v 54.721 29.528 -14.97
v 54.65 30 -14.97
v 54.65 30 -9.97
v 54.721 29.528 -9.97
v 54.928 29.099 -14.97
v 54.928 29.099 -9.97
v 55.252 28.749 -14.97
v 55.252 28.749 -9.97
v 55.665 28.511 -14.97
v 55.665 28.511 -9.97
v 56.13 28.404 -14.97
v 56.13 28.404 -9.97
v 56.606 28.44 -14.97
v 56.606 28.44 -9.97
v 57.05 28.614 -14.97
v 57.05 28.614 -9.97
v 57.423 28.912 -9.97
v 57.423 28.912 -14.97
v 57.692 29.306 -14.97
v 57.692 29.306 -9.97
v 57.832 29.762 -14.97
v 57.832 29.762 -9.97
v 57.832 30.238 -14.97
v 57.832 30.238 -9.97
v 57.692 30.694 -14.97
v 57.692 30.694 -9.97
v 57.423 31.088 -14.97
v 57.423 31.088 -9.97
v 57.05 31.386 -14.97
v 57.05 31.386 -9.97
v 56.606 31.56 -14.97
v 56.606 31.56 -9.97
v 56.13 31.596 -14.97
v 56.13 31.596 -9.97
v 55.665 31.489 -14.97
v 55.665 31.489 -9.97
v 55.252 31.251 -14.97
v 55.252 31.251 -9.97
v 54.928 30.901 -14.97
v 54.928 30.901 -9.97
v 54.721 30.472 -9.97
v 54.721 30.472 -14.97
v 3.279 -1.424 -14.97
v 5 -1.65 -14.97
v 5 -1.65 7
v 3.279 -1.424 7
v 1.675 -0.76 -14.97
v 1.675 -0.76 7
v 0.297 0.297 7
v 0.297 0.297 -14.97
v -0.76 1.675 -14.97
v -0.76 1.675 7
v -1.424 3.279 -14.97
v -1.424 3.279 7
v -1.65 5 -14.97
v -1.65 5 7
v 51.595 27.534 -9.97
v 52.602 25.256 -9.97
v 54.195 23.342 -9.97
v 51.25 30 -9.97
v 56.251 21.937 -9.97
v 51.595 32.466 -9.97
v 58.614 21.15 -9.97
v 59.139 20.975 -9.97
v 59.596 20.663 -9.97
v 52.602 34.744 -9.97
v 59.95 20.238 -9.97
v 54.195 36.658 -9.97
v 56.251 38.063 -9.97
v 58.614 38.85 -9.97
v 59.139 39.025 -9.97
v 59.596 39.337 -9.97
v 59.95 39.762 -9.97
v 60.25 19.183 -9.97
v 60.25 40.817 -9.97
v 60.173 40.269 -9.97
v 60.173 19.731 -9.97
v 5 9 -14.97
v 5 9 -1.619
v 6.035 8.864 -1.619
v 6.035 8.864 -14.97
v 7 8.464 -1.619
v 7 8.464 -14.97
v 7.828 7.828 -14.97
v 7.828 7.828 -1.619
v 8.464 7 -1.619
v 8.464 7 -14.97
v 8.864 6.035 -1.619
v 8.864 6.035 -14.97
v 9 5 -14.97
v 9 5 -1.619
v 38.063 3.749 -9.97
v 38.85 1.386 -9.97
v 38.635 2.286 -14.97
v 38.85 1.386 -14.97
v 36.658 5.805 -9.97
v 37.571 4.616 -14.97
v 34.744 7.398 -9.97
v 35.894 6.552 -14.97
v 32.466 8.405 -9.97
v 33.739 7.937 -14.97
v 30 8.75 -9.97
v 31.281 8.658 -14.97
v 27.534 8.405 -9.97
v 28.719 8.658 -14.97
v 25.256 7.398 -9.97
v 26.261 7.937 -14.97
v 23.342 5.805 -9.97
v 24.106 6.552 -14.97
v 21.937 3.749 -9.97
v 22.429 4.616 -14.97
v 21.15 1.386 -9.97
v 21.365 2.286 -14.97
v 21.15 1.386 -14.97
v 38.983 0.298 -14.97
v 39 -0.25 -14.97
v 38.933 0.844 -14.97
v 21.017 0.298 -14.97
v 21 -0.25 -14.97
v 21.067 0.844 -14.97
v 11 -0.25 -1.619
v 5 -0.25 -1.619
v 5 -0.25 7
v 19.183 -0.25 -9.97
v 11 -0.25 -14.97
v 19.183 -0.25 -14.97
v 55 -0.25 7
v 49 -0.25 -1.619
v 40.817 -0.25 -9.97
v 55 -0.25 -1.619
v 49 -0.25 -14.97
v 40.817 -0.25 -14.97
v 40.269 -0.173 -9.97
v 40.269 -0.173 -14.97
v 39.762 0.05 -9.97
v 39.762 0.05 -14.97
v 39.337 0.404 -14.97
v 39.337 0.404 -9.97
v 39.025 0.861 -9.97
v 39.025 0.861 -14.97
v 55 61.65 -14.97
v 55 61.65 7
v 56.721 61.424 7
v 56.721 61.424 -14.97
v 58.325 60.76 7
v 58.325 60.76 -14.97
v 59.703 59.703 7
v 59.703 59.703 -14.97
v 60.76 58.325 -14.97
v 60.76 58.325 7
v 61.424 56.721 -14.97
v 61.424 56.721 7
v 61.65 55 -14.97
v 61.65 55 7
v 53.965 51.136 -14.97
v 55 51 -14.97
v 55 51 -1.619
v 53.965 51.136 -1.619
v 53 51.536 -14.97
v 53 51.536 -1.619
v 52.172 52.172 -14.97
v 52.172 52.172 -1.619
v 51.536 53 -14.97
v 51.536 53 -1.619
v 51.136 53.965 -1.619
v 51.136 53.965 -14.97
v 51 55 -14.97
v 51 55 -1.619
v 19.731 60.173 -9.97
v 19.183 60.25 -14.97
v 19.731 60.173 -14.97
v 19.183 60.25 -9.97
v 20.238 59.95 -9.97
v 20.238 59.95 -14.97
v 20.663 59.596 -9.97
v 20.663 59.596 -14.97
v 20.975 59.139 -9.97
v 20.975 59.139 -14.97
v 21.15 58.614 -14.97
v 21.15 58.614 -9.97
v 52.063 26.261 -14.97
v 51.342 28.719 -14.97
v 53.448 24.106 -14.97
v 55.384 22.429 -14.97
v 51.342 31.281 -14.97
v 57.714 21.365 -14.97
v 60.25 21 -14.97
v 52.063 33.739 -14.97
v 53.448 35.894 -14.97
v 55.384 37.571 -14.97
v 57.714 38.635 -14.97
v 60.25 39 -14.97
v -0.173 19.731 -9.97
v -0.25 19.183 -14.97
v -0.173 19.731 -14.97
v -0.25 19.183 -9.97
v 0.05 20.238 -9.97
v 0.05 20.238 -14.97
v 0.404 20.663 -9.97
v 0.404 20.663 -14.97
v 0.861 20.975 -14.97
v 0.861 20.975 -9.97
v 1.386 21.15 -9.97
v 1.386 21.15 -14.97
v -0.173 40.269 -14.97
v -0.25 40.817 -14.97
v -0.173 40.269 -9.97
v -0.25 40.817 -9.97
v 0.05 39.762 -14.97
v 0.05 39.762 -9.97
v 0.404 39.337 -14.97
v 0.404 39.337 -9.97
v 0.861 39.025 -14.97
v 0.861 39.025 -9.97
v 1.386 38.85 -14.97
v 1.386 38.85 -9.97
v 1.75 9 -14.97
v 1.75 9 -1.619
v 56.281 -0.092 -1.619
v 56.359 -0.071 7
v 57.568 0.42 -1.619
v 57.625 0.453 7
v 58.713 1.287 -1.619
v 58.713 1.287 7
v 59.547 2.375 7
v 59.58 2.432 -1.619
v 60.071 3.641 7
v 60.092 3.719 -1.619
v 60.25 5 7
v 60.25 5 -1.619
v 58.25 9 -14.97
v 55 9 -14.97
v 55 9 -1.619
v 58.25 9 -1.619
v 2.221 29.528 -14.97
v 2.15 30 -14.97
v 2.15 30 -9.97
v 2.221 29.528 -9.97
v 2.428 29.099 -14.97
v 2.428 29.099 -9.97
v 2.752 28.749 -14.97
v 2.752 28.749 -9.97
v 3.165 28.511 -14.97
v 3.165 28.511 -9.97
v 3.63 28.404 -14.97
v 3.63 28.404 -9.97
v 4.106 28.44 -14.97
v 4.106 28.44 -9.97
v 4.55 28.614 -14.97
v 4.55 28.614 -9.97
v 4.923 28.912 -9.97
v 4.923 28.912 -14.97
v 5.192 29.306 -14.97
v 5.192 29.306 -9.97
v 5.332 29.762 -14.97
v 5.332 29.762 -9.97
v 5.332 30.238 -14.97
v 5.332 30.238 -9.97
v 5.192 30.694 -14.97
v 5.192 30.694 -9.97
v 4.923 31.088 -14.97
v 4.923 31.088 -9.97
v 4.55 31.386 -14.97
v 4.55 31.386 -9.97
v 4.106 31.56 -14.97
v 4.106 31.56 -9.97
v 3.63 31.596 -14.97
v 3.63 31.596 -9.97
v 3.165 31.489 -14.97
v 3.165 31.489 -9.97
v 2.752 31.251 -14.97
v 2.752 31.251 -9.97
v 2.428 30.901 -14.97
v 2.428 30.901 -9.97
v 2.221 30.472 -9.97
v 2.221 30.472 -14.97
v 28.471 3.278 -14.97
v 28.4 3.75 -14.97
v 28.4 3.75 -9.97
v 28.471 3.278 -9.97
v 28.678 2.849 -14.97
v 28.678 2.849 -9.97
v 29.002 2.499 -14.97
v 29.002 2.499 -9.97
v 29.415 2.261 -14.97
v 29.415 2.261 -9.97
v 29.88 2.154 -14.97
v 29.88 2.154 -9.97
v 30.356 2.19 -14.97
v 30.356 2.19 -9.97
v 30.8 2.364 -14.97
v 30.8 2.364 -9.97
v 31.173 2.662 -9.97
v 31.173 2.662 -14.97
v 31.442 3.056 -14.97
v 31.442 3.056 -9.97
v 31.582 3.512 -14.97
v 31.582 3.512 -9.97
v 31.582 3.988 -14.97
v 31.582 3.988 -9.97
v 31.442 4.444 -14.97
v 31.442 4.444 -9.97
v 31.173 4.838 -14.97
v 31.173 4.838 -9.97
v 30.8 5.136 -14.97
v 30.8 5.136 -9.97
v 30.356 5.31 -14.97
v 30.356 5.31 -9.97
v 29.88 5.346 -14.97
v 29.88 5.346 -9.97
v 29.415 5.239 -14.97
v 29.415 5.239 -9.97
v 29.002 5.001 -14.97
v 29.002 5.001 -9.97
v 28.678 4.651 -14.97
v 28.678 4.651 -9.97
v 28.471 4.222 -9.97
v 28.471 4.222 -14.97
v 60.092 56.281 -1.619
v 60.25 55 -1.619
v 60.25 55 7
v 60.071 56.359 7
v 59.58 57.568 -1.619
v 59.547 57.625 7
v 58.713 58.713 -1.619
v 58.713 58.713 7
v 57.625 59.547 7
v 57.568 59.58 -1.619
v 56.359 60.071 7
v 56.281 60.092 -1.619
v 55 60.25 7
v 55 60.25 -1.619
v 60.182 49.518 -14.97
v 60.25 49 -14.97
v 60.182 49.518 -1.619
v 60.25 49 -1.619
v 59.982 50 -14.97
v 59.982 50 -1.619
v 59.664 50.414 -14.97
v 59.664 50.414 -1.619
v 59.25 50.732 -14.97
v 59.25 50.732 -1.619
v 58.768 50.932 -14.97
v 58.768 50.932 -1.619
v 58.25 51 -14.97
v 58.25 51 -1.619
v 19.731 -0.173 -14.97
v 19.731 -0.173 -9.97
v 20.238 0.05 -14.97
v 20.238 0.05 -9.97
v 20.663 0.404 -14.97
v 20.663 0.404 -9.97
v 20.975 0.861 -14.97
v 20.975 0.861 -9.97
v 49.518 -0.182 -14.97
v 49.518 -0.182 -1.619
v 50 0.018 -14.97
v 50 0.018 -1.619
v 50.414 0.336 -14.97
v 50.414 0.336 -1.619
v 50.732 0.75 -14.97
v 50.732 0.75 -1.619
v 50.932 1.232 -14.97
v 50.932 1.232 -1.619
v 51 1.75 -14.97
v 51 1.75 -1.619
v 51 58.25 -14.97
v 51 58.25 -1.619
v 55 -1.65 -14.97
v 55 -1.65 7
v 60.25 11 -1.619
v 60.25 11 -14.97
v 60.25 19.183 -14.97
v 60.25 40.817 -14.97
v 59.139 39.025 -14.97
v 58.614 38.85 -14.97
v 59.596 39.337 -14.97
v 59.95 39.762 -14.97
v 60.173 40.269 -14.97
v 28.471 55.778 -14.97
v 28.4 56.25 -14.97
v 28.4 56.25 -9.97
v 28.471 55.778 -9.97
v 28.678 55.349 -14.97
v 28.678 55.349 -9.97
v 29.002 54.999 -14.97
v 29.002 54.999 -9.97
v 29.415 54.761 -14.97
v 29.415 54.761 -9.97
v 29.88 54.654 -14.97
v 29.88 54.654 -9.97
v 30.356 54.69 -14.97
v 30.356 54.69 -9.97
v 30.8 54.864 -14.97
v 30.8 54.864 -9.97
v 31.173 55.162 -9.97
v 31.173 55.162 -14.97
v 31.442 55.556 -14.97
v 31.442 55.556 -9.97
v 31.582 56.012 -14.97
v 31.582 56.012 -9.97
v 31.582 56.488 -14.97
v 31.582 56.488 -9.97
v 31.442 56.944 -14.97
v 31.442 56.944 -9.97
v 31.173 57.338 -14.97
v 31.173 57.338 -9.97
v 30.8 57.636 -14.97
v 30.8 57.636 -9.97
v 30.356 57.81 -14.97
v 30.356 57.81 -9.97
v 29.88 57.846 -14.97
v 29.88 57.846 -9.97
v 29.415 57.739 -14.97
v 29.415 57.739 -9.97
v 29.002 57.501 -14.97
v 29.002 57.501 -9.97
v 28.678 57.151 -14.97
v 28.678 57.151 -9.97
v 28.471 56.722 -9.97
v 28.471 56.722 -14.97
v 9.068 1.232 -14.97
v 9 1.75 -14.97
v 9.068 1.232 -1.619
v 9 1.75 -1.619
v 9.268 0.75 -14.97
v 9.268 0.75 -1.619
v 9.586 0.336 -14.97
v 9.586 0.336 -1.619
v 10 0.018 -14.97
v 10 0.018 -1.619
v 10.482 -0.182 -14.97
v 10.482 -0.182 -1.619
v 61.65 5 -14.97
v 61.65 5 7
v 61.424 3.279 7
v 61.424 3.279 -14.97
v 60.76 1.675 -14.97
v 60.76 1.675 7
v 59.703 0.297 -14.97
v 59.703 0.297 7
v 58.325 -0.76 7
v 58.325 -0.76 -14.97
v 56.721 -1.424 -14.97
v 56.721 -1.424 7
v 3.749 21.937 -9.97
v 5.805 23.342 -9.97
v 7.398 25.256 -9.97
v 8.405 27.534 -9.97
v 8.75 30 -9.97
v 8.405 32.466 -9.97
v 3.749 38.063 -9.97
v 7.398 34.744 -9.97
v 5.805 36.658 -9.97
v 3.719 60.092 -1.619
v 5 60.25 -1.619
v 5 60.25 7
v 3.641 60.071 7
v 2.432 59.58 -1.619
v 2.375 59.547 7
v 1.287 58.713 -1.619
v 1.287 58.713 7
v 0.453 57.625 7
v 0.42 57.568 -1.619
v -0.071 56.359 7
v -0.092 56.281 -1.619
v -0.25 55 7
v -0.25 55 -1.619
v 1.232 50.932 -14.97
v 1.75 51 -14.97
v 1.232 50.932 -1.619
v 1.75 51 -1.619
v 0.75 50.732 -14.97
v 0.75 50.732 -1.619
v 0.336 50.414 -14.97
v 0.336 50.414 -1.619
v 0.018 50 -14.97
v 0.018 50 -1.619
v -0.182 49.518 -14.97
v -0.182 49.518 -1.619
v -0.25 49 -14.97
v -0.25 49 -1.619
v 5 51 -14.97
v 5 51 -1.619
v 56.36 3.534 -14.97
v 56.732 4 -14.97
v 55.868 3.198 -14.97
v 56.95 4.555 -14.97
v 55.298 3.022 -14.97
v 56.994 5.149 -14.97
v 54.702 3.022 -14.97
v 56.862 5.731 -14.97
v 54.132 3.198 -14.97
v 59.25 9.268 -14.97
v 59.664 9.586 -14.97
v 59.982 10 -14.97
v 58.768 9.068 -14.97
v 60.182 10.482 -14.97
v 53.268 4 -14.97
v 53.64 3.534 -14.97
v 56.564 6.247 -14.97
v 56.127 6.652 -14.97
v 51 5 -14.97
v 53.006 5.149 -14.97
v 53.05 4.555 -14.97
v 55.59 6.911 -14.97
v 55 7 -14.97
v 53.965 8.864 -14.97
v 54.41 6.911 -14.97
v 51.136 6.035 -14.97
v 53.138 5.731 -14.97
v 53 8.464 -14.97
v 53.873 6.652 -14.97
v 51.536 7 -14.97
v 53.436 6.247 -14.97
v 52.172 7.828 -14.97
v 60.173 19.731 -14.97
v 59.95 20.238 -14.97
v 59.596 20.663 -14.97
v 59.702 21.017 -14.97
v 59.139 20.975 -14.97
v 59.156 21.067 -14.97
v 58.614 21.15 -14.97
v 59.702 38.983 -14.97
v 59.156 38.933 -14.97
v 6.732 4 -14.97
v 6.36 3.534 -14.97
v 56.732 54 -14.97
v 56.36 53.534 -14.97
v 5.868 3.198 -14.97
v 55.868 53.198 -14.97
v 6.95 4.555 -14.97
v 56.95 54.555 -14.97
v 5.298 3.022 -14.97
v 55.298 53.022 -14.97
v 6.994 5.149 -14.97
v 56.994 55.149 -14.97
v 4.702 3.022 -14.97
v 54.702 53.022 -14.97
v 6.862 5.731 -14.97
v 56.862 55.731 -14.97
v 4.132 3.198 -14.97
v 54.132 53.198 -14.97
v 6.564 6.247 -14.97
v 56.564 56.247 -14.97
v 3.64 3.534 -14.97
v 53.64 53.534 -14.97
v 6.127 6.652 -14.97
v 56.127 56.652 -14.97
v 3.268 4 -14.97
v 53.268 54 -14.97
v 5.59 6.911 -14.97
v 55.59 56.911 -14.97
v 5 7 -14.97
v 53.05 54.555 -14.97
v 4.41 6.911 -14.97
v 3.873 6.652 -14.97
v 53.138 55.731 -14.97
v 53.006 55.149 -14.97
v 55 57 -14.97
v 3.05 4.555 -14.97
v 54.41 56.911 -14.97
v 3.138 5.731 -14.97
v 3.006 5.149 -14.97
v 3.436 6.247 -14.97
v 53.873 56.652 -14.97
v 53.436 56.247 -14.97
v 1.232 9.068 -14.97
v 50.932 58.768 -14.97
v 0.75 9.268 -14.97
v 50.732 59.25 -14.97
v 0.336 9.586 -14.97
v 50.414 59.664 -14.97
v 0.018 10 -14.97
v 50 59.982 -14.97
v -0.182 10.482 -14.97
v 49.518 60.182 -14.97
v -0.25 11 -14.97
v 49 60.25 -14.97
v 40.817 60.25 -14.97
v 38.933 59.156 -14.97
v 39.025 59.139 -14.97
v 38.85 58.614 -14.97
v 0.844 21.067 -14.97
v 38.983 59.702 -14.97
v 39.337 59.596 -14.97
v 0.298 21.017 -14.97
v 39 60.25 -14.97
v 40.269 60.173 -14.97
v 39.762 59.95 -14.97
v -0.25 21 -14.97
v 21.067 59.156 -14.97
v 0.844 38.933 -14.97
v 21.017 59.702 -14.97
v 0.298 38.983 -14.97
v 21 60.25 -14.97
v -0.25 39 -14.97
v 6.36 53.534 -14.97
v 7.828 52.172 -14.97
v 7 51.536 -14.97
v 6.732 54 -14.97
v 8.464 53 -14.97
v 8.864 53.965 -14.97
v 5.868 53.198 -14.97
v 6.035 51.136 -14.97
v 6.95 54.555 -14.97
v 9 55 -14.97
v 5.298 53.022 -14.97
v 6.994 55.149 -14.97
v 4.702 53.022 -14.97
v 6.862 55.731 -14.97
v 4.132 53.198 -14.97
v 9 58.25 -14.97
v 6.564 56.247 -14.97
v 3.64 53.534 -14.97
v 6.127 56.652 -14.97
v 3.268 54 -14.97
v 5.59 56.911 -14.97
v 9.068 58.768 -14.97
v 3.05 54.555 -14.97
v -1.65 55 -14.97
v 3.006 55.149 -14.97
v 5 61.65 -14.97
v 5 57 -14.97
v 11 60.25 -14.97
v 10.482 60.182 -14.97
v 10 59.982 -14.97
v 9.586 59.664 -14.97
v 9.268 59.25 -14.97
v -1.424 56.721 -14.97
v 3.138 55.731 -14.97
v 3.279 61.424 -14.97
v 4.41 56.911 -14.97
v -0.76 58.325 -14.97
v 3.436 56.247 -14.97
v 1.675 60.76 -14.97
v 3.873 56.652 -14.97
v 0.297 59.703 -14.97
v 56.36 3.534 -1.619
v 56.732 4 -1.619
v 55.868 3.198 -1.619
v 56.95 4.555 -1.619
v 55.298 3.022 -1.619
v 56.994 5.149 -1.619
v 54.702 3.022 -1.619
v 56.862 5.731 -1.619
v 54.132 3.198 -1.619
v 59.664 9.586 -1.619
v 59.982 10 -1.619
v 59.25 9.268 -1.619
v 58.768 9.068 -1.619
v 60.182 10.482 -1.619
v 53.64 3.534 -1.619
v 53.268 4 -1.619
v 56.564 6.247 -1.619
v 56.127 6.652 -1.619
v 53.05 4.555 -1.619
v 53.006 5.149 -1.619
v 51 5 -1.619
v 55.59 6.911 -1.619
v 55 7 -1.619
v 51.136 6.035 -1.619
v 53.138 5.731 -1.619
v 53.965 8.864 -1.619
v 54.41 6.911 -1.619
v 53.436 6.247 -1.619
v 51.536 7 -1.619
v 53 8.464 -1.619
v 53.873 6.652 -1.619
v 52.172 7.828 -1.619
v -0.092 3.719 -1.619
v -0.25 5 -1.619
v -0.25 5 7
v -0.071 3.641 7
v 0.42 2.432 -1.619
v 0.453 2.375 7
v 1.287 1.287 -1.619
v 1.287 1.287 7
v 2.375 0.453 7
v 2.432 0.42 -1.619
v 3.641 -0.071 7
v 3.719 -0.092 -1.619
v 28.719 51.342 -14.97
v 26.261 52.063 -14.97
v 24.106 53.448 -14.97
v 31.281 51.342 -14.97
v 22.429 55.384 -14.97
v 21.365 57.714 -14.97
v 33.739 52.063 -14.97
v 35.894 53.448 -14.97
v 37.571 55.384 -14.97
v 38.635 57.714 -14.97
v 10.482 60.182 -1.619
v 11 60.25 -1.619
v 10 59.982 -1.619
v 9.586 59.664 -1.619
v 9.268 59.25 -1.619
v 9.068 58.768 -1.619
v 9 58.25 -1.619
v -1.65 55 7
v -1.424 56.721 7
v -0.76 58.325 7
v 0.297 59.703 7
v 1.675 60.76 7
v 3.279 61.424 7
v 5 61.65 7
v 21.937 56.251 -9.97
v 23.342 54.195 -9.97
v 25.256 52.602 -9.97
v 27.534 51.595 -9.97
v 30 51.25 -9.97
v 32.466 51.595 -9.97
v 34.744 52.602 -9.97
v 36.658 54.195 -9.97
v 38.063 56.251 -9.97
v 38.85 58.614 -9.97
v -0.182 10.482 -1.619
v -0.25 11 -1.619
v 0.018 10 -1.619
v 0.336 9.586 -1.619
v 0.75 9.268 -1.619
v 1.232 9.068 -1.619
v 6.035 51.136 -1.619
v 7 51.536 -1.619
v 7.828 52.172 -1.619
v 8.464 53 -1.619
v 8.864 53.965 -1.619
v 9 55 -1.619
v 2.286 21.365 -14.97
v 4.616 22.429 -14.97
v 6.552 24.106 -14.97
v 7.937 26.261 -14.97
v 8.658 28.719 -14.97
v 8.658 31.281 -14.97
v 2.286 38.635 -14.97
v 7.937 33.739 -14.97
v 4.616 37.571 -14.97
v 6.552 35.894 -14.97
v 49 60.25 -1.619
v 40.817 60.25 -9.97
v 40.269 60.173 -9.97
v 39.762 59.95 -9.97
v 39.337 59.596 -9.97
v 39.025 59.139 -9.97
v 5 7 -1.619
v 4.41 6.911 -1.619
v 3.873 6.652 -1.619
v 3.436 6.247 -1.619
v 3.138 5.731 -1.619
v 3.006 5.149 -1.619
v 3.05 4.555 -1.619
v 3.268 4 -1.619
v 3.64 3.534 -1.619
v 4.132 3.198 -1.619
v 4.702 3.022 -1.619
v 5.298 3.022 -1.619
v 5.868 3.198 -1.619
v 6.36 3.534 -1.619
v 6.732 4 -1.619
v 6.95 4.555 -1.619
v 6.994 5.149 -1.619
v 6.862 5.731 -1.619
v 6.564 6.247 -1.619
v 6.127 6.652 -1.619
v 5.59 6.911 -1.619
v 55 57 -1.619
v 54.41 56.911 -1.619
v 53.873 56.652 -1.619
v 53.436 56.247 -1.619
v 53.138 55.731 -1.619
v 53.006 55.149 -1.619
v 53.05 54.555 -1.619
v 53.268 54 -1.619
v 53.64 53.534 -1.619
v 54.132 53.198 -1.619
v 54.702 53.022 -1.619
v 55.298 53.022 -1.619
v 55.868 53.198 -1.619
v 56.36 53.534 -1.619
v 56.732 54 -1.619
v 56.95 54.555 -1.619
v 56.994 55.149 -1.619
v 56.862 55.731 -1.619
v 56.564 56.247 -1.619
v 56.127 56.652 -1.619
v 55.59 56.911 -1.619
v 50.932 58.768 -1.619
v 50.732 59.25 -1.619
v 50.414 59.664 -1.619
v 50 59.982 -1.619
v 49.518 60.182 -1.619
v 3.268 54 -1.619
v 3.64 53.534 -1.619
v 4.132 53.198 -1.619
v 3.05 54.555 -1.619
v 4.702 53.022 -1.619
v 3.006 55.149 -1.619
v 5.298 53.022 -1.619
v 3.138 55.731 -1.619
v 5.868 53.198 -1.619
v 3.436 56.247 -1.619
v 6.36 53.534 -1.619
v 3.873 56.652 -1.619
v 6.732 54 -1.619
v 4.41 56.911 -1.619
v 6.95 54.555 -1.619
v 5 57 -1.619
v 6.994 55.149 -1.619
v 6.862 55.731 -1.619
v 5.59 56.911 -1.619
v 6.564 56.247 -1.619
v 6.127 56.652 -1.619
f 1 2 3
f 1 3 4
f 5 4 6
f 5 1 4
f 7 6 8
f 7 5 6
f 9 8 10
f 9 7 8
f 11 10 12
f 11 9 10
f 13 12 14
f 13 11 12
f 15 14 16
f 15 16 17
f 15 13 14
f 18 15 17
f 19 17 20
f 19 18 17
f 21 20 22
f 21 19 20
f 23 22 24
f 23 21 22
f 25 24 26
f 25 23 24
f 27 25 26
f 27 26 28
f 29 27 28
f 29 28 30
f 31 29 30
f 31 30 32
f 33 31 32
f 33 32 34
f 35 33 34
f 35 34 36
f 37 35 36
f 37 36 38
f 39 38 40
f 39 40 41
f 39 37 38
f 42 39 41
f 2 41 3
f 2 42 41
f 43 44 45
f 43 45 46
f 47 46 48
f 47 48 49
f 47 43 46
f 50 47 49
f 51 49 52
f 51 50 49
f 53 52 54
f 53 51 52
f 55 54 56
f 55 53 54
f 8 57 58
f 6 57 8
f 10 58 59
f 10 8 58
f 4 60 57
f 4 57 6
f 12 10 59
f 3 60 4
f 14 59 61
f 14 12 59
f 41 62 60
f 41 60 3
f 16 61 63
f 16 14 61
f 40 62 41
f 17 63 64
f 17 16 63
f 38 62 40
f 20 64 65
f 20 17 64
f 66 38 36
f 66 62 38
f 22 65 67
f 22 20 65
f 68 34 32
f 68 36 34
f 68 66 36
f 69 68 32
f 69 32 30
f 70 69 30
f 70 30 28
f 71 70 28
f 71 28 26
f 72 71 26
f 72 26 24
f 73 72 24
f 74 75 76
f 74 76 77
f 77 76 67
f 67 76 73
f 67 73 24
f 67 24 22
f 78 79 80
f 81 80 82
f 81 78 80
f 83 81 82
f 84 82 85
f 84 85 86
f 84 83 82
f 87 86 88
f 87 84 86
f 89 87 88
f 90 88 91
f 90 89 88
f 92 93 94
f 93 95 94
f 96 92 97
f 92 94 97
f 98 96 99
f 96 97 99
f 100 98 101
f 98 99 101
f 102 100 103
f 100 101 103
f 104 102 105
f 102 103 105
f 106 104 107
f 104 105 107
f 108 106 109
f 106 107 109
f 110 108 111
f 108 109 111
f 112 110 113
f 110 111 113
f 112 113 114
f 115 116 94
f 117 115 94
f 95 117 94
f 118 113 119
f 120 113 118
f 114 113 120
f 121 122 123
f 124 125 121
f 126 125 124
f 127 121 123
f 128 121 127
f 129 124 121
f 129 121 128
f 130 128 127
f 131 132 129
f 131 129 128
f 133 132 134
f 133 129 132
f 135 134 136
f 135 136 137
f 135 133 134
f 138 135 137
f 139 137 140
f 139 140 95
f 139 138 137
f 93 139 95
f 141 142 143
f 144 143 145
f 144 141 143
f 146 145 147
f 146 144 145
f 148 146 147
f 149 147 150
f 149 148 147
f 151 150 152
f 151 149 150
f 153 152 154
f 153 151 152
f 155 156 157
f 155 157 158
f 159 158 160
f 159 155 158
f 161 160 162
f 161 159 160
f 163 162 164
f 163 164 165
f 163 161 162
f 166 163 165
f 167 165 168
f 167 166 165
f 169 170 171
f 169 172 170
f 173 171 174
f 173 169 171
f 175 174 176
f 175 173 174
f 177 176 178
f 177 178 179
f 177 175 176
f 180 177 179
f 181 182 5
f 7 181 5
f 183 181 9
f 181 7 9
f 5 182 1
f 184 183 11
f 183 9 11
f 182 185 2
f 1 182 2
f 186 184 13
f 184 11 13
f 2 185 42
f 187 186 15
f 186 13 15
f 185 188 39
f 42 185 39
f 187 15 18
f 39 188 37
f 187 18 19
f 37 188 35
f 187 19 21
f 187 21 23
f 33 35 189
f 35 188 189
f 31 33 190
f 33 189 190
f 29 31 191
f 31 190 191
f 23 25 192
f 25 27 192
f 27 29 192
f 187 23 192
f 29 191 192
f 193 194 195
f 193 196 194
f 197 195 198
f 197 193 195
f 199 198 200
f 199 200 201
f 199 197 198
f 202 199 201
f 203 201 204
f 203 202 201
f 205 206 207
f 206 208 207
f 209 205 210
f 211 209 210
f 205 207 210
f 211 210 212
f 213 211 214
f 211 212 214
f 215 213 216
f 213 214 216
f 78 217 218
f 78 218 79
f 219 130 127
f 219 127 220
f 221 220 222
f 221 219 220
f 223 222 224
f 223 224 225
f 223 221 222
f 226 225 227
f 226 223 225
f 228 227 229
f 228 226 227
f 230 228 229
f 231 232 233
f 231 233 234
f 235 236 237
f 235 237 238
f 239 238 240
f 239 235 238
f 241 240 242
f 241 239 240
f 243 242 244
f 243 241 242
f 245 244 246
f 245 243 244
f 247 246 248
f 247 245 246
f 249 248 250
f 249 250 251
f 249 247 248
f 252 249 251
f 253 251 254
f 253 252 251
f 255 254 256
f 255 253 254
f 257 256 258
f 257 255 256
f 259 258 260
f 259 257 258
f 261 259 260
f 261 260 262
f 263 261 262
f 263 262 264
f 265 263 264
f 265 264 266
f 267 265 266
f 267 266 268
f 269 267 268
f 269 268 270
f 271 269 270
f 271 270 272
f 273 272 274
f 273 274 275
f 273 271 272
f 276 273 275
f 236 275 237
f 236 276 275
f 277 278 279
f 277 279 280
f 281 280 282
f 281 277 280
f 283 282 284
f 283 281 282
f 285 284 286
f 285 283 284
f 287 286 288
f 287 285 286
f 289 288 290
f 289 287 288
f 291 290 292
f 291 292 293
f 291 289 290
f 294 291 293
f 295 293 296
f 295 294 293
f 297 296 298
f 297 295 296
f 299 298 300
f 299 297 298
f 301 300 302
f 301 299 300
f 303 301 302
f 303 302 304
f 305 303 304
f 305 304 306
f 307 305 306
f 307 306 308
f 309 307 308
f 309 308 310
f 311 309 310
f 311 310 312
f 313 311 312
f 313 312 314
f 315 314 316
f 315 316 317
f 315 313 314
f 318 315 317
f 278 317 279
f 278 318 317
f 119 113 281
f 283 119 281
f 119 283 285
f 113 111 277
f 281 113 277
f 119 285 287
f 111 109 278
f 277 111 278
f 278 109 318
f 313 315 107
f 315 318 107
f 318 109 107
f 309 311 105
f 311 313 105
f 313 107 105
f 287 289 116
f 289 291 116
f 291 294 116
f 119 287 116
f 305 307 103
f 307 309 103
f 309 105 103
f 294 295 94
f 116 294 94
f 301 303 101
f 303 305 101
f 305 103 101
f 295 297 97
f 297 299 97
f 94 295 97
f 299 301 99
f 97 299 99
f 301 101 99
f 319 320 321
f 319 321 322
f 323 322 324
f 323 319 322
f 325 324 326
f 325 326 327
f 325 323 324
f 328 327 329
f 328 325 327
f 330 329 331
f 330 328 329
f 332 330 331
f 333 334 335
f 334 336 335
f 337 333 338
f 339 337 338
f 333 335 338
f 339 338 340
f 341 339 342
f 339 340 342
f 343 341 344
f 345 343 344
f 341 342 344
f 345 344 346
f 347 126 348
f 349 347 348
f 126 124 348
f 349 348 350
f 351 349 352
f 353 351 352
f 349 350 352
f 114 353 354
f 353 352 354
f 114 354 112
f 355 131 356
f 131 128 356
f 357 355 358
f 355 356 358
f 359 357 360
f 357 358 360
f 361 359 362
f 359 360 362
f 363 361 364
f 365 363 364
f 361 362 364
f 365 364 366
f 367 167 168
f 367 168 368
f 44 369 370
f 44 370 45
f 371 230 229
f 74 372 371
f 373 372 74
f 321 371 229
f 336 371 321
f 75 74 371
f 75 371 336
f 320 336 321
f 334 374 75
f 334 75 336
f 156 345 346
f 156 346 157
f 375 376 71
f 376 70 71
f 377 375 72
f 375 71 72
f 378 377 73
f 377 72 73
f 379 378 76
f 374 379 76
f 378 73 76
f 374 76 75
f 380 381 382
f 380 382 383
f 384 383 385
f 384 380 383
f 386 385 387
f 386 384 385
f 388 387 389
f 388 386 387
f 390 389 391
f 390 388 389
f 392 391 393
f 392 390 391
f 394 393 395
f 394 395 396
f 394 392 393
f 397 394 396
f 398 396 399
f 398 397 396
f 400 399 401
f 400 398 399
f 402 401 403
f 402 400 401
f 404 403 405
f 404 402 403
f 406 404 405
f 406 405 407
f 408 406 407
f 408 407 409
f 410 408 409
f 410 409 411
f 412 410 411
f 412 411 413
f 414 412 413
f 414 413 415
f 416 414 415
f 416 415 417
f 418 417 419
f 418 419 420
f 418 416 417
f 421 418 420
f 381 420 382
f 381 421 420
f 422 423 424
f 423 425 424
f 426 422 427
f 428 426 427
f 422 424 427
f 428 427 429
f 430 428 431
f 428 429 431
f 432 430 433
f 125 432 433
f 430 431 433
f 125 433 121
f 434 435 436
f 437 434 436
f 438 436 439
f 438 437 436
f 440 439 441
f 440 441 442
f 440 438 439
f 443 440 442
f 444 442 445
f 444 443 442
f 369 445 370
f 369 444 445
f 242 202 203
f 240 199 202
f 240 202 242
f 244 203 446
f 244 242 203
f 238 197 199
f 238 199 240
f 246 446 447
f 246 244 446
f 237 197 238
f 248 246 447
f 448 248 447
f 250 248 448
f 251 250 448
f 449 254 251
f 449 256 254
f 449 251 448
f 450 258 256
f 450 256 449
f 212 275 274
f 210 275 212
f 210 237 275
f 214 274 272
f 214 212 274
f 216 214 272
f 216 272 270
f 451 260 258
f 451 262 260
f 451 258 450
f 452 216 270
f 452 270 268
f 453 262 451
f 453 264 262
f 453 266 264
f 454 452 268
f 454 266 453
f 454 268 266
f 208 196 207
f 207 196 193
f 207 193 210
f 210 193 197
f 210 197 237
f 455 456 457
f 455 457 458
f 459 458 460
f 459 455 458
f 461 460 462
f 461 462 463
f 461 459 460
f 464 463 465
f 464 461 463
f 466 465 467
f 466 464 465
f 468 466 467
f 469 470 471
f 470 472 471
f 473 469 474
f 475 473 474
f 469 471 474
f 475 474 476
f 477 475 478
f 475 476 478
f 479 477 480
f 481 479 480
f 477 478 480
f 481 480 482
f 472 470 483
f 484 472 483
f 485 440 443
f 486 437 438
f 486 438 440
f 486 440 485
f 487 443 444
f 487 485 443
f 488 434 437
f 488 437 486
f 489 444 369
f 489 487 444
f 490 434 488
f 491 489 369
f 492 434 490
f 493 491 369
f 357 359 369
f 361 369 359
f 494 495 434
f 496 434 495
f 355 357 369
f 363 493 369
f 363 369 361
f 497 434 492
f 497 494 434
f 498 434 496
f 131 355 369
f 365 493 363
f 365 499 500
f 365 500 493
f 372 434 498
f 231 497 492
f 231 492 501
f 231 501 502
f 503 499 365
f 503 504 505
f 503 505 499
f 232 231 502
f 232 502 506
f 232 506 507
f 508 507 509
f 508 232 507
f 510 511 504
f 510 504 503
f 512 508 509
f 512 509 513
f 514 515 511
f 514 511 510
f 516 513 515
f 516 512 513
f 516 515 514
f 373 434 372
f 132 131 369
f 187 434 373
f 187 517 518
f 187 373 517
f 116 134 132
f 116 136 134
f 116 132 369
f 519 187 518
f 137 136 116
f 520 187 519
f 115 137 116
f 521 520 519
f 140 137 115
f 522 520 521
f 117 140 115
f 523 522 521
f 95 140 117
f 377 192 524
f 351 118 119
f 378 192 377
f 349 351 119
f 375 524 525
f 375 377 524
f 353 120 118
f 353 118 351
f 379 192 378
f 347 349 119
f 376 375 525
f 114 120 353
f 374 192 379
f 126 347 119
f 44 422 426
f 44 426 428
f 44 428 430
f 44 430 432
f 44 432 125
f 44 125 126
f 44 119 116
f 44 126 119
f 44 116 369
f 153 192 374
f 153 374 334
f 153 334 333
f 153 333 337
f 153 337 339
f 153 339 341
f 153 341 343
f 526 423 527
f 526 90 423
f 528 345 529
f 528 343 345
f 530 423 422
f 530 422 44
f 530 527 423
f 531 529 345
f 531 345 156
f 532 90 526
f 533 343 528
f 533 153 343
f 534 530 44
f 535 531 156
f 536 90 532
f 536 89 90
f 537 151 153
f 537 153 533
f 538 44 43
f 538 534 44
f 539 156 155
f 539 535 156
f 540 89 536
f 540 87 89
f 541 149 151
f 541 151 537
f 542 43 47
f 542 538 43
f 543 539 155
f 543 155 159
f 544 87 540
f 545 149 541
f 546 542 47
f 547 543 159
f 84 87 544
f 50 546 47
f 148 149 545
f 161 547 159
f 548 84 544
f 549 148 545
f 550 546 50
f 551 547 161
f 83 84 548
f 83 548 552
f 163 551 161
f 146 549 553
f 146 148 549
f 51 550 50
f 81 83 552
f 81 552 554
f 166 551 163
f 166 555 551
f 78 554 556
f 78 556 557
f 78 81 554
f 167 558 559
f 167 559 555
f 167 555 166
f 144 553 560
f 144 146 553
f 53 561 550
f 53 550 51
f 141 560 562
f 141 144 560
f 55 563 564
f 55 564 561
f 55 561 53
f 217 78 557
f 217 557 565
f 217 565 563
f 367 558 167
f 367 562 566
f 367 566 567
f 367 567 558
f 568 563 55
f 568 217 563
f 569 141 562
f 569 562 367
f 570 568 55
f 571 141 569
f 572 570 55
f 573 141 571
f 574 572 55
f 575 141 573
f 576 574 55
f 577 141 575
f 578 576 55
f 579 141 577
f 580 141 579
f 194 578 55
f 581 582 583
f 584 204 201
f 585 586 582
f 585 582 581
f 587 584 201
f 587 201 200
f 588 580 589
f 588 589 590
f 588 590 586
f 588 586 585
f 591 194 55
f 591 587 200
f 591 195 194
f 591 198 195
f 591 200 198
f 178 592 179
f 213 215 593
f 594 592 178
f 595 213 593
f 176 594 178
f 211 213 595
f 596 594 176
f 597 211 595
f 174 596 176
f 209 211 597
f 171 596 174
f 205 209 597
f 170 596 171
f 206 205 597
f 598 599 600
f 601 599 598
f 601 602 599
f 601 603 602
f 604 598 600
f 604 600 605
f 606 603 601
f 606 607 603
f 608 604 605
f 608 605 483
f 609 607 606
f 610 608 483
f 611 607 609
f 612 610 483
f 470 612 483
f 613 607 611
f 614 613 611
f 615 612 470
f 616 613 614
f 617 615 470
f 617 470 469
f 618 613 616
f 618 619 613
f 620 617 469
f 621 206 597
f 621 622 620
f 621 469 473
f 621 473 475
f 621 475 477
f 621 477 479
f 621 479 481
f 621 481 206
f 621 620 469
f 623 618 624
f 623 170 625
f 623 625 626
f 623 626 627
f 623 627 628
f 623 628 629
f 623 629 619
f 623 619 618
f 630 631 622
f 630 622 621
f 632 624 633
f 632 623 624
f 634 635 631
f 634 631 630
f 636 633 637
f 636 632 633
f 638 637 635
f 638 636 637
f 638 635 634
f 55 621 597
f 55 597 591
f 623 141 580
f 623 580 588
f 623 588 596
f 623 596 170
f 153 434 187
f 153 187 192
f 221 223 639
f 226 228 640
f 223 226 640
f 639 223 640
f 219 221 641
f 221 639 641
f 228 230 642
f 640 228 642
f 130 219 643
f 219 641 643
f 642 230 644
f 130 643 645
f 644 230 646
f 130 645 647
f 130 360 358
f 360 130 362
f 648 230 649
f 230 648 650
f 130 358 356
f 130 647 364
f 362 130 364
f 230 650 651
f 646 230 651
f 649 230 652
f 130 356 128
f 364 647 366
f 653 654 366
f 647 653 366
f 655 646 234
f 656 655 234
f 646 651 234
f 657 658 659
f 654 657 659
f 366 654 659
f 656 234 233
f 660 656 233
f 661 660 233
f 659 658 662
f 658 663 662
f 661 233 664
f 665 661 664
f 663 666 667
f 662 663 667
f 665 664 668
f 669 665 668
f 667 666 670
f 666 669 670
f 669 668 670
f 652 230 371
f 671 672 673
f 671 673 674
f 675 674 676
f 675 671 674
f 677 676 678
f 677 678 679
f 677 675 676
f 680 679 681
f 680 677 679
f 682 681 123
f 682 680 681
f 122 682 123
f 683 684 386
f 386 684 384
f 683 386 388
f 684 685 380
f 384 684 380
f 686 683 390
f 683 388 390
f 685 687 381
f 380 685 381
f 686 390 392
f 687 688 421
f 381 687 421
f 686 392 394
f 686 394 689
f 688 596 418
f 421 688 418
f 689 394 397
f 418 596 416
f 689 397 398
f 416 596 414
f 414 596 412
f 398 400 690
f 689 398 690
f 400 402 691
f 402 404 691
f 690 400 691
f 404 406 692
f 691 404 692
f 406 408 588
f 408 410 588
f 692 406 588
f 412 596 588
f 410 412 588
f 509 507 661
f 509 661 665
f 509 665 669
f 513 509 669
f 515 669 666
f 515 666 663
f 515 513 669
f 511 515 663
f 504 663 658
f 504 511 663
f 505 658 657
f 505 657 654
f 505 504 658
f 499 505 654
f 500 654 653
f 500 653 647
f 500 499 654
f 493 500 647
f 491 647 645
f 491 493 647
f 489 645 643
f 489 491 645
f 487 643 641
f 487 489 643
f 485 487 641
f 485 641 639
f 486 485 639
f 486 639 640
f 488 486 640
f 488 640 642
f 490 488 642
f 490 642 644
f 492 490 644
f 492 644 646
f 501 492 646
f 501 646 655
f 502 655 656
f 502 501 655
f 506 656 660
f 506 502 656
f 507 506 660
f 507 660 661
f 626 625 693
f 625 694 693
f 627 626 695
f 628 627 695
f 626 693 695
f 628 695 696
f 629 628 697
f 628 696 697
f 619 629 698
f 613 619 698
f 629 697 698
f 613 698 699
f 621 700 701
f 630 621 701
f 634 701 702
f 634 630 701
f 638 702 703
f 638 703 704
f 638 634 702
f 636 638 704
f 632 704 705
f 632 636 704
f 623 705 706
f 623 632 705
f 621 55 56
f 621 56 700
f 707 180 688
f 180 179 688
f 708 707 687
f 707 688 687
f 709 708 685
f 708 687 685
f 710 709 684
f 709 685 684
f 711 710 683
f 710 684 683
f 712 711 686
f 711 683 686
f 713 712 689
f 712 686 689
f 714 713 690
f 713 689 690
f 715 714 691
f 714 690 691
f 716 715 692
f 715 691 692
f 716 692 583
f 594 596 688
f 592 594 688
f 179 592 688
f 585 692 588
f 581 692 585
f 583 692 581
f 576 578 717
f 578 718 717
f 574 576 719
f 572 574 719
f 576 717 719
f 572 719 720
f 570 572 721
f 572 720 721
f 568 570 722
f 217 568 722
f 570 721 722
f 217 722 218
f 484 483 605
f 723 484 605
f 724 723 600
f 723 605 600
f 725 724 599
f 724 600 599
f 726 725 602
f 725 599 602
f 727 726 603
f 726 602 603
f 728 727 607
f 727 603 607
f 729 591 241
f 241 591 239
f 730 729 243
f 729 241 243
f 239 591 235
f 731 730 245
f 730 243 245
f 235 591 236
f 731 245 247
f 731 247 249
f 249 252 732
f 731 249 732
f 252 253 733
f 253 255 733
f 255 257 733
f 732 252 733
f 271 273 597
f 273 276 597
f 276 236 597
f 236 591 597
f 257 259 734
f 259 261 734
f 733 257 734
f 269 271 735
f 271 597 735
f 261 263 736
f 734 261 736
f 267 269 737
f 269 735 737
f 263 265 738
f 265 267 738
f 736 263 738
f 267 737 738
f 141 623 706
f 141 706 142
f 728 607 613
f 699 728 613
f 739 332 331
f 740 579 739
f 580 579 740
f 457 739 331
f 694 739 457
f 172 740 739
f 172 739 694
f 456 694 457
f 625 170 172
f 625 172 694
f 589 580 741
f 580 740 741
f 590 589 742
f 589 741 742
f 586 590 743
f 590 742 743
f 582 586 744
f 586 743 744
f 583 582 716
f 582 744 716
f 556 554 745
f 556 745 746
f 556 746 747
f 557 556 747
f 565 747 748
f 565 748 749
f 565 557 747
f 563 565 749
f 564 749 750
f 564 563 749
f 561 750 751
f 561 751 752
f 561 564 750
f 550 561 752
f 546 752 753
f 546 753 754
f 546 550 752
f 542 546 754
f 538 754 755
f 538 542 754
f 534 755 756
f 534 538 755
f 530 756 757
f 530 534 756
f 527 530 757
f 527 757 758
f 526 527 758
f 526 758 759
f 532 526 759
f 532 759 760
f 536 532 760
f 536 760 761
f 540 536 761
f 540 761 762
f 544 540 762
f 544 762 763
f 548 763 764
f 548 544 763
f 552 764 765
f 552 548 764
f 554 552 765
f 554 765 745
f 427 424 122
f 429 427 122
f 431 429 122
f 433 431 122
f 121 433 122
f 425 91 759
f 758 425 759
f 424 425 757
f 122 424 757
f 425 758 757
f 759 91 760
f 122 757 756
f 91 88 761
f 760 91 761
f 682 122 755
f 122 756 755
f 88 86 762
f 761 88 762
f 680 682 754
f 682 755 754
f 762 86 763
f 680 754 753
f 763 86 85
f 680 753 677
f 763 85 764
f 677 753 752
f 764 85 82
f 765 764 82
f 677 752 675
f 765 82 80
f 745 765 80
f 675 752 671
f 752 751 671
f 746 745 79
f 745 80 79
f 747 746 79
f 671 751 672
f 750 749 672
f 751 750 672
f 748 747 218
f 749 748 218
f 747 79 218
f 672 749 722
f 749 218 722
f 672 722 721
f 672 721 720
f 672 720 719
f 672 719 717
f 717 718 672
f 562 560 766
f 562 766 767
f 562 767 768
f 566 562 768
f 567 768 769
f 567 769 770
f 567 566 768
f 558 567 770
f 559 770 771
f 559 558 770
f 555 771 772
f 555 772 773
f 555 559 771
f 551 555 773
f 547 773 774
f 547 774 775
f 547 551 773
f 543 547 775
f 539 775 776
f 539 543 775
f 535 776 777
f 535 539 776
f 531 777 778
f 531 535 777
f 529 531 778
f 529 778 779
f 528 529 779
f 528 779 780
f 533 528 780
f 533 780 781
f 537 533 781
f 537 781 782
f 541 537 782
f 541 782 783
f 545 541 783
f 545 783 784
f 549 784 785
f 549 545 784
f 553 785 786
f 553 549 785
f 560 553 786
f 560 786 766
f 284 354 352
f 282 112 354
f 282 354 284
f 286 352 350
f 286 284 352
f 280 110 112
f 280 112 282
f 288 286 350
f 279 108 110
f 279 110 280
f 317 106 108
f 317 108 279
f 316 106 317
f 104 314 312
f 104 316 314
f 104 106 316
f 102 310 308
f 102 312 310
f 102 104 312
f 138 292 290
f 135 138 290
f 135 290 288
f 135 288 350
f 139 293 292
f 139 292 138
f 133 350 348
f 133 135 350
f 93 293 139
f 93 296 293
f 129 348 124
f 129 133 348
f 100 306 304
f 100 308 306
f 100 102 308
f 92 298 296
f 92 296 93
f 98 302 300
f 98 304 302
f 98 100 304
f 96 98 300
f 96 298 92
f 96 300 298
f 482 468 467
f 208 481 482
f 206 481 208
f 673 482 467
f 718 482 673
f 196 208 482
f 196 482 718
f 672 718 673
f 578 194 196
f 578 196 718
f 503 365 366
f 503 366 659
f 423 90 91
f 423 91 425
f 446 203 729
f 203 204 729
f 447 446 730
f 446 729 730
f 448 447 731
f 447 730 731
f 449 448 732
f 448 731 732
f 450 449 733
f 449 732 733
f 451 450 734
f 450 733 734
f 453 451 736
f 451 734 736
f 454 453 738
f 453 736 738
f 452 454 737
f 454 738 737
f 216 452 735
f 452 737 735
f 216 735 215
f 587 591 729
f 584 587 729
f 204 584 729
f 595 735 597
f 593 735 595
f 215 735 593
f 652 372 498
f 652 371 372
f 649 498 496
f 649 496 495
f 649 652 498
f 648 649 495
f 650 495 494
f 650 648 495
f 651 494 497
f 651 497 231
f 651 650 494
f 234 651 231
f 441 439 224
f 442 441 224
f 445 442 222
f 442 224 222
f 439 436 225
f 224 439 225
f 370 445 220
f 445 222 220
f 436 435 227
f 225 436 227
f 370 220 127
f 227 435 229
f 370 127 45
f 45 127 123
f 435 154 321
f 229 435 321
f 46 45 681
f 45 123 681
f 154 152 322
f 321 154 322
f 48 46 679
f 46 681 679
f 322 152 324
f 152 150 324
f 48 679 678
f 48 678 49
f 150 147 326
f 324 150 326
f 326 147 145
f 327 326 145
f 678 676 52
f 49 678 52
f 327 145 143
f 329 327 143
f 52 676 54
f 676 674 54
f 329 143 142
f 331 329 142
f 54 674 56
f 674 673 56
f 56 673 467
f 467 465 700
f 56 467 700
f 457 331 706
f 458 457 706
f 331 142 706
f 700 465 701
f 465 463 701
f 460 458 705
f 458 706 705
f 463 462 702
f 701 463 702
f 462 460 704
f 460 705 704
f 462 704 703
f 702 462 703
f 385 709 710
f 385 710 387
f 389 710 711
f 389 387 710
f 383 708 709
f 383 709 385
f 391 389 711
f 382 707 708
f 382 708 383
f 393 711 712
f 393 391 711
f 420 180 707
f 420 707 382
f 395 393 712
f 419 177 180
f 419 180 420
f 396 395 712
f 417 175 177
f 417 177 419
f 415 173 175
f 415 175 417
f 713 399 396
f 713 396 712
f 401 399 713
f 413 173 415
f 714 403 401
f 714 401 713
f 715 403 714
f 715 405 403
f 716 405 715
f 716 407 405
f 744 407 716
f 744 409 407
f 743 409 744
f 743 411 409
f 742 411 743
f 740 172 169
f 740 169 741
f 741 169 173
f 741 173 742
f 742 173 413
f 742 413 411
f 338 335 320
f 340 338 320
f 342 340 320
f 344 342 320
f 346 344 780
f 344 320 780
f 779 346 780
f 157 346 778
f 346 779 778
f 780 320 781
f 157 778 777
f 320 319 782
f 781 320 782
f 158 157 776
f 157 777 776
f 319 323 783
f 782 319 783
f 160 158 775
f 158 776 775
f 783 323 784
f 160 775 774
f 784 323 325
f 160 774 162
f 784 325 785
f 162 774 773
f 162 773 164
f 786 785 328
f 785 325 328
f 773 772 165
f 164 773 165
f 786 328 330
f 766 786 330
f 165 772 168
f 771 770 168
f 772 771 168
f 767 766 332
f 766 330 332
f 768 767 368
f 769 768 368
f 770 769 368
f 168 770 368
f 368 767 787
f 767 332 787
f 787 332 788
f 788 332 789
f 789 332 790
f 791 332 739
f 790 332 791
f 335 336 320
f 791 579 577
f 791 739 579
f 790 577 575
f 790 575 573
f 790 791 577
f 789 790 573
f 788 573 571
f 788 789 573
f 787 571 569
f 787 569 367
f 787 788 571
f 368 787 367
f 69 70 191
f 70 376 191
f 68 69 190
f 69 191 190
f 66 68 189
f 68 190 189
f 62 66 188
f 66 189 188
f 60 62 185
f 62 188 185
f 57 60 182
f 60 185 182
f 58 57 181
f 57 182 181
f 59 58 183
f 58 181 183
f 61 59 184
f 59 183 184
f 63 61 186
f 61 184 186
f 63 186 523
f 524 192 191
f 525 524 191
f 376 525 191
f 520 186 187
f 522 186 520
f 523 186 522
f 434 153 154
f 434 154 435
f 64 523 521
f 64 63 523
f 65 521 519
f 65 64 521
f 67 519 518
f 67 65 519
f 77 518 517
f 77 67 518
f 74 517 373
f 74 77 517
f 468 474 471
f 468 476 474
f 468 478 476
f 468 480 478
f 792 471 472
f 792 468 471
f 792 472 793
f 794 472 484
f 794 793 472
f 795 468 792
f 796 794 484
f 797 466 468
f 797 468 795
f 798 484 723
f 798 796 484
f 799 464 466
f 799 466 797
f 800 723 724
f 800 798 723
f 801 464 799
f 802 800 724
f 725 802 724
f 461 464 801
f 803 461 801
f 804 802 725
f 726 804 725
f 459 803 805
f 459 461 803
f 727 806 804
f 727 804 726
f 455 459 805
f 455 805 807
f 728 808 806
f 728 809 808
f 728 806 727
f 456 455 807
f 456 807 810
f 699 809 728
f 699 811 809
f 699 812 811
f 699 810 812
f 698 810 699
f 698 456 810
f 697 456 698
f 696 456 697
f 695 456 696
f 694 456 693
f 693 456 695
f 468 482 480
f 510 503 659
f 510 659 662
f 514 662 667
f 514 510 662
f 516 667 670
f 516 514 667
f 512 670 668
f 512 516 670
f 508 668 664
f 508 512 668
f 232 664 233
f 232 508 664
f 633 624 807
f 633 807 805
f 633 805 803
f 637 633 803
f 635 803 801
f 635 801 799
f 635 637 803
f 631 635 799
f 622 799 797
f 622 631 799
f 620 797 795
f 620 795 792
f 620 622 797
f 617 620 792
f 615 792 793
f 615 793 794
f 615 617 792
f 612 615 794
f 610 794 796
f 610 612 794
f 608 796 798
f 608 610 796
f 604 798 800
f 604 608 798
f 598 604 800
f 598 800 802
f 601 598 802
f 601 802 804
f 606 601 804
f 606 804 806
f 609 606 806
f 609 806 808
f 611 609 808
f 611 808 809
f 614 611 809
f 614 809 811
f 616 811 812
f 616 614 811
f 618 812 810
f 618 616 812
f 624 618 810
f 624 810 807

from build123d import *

# Parameters (mm, degrees)
BOSS_EXTRUDE1_DEPTH      = 7
BOSS_EXTRUDE1_DEPTH_BACK = 14.970201
BOSS_EXTRUDE2_START      = -14.970201
SKETCH2_R                = 2
BOSS_EXTRUDE2_DEPTH      = 13.350798149
BOSS_EXTRUDE3_START      = -14.970203
SKETCH3_R                = 1.6
BOSS_EXTRUDE3_DEPTH      = 5.000003
FILLET1_R                = 2


with BuildPart() as part:
    # Sketch1 → Boss-Extrude1 (new, two sides: drawn at the far end of the back side and taken through both)
    with BuildSketch(Plane.XY.offset(-BOSS_EXTRUDE1_DEPTH_BACK)):
        with BuildLine():
            Line((54.999742941, -1.649999966), (5.000257256, -1.649999966))
            ThreePointArc((5.000257256, -1.649999966), (0.297273819, 0.297273819), (-1.649999966, 5.000257256))
            Line((-1.649999966, 5.000257256), (-1.649999966, 54.999742941))
            ThreePointArc((-1.649999966, 54.999742941), (0.297274177, 59.702725823), (5.000257059, 61.649999966))
            Line((5.000257059, 61.649999966), (54.999743139, 61.649999966))
            ThreePointArc((54.999743139, 61.649999966), (59.702725466, 59.702725466), (61.649999966, 54.999743139))
            Line((61.649999966, 54.999743139), (61.649999966, 5.000257059))
            ThreePointArc((61.649999966, 5.000257059), (59.702725823, 0.297274177), (54.999742941, -1.649999966))
        make_face()
        with BuildLine():
            ThreePointArc((5.000039752, 60.249999994), (1.287223653, 58.712776347), (-0.249999994, 54.999960248))
            Line((-0.249999994, 54.999960248), (-0.249999994, 5.000039782))
            ThreePointArc((-0.249999994, 5.000039782), (1.287223296, 1.287223296), (5.000039782, -0.249999994))
            Line((5.000039782, -0.249999994), (54.999960248, -0.249999994))
            ThreePointArc((54.999960248, -0.249999994), (58.712776347, 1.287223653), (60.249999994, 5.000039752))
            Line((60.249999994, 5.000039752), (60.249999994, 54.999960279))
            ThreePointArc((60.249999994, 54.999960279), (58.712775989, 58.712775989), (54.999960279, 60.249999994))
            Line((54.999960279, 60.249999994), (5.000039752, 60.249999994))
        make_face(mode=Mode.SUBTRACT)
    extrude(amount=BOSS_EXTRUDE1_DEPTH + BOSS_EXTRUDE1_DEPTH_BACK)


with BuildPart() as boss_extrude2_tool:
    # Sketch2 → Boss-Extrude2 (new body)
    # profile 1 of 4: a face of its own
    with BuildSketch(Plane.XY.offset(BOSS_EXTRUDE2_START)):
        with BuildLine():
            Line((9.00000016, 54.99999922), (9.00000016, 60.249999994))
            Line((9.00000016, 60.249999994), (5.000039752, 60.249999994))
            add(Edge.make_bspline(
                [(-0.249999994, 54.999960248), (-0.250954892, 58.075921633), (1.924078367, 60.250954892), (5.000039752, 60.249999994)],
                knots=[0, 0, 0, 0, 1, 1, 1, 1], degree=3, weights=[1, 0.804591489, 0.804591489, 1]))
            Line((-0.249999994, 54.999960248), (-0.249999994, 50.99999922))
            Line((-0.249999994, 50.99999922), (5.00000016, 50.99999922))
            ThreePointArc((5.00000016, 50.99999922), (7.828427285, 52.171572095), (9.00000016, 54.99999922))
        make_face()
        with Locations(Location((5.00000016, 54.99999922, 0), (0, 0, 90))):
            Circle(SKETCH2_R, mode=Mode.SUBTRACT)
    # profile 2 of 4: a face of its own
    with BuildSketch(Plane.XY.offset(BOSS_EXTRUDE2_START)):
        with BuildLine():
            Line((50.99999922, 54.99999984), (50.99999922, 60.249999994))
            Line((50.99999922, 60.249999994), (54.999960248, 60.249999994))
            add(Edge.make_bspline(
                [(54.999960248, 60.249999994), (58.075921633, 60.250954892), (60.250954892, 58.075921633), (60.249999994, 54.999960248)],
                knots=[0, 0, 0, 0, 1, 1, 1, 1], degree=3, weights=[1, 0.804591489, 0.804591489, 1]))
            Line((60.249999994, 54.999960248), (60.249999994, 50.99999984))
            Line((60.249999994, 50.99999984), (54.99999922, 50.99999984))
            ThreePointArc((54.99999922, 50.99999984), (52.171572095, 52.171572715), (50.99999922, 54.99999984))
        make_face()
        with Locations(Location((54.99999922, 54.99999984, 0), (0, 0, 90))):
            Circle(SKETCH2_R, mode=Mode.SUBTRACT)
    # profile 3 of 4: a face of its own
    with BuildSketch(Plane.XY.offset(BOSS_EXTRUDE2_START)):
        with BuildLine():
            Line((54.99999984, 9.00000078), (60.249999994, 9.00000078))
            Line((60.249999994, 9.00000078), (60.249999994, 5.000039752))
            add(Edge.make_bspline(
                [(60.249999994, 5.000039752), (60.250954892, 1.924078367), (58.075921633, -0.250954892), (54.999960248, -0.249999994)],
                knots=[0, 0, 0, 0, 1, 1, 1, 1], degree=3, weights=[1, 0.804591489, 0.804591489, 1]))
            Line((54.999960248, -0.249999994), (50.99999984, -0.249999994))
            Line((50.99999984, -0.249999994), (50.99999984, 5.00000078))
            ThreePointArc((50.99999984, 5.00000078), (52.171572715, 7.828427905), (54.99999984, 9.00000078))
        make_face()
        with Locations(Location((54.99999984, 5.00000078, 0), (0, 0, 90))):
            Circle(SKETCH2_R, mode=Mode.SUBTRACT)
    # profile 4 of 4: a face of its own
    with BuildSketch(Plane.XY.offset(BOSS_EXTRUDE2_START)):
        with BuildLine():
            Line((9.00000078, 5.00000016), (9.00000078, -0.249999994))
            Line((9.00000078, -0.249999994), (5.000039752, -0.249999994))
            add(Edge.make_bspline(
                [(5.000039752, -0.249999994), (1.924078367, -0.250954892), (-0.250954892, 1.924078367), (-0.249999994, 5.000039752)],
                knots=[0, 0, 0, 0, 1, 1, 1, 1], degree=3, weights=[1, 0.804591489, 0.804591489, 1]))
            Line((-0.249999994, 5.000039752), (-0.249999994, 9.00000016))
            Line((-0.249999994, 9.00000016), (5.00000078, 9.00000016))
            ThreePointArc((5.00000078, 9.00000016), (7.828427905, 7.828427285), (9.00000078, 5.00000016))
        make_face()
        with Locations(Location((5.00000078, 5.00000016, 0), (0, 0, 90))):
            Circle(SKETCH2_R, mode=Mode.SUBTRACT)
    extrude(amount=BOSS_EXTRUDE2_DEPTH)


with BuildPart() as part_1:
    add(part.part)


with BuildPart() as part_2:
    # Boss-Extrude2: joined with boss_extrude2_tool
    add(part_1.part.fuse(boss_extrude2_tool.part, tol=0.00001))

    # Sketch3 → Boss-Extrude3 (add)
    # profile 1 of 4: a face of its own
    with BuildSketch(Plane.XY.offset(BOSS_EXTRUDE3_START)):
        with BuildLine():
            Line((60.249999994, 20.999999985), (60.249999994, 38.999999985))
            ThreePointArc((60.249999994, 38.999999985), (51.249999994, 29.999999985), (60.249999994, 20.999999985))
        make_face()
        with Locations(Location((56.249999994, 29.999999985, 0), (0, 0, 180))):
            Circle(SKETCH3_R, mode=Mode.SUBTRACT)
    # profile 2 of 4: a face of its own
    with BuildSketch(Plane.XY.offset(BOSS_EXTRUDE3_START)):
        with BuildLine():
            Line((39.000000015, 60.249999994), (21.000000015, 60.249999994))
            ThreePointArc((21.000000015, 60.249999994), (30.000000015, 51.249999994), (39.000000015, 60.249999994))
        make_face()
        with Locations(Location((30.000000015, 56.249999994, 0), (0, 0, 180))):
            Circle(SKETCH3_R, mode=Mode.SUBTRACT)
    # profile 3 of 4: a face of its own
    with BuildSketch(Plane.XY.offset(BOSS_EXTRUDE3_START)):
        with BuildLine():
            Line((20.999999985, -0.249999994), (38.999999985, -0.249999994))
            ThreePointArc((38.999999985, -0.249999994), (29.999999985, 8.750000006), (20.999999985, -0.249999994))
        make_face()
        with Locations(Location((29.999999985, 3.750000006, 0), (0, 0, 180))):
            Circle(SKETCH3_R, mode=Mode.SUBTRACT)
    # profile 4 of 4: a face of its own
    with BuildSketch(Plane.XY.offset(BOSS_EXTRUDE3_START)):
        with BuildLine():
            Line((-0.249999994, 39.000000015), (-0.249999994, 21.000000015))
            ThreePointArc((-0.249999994, 21.000000015), (8.750000006, 30.000000015), (-0.249999994, 39.000000015))
        make_face()
        with Locations(Location((3.750000006, 30.000000015, 0), (0, 0, 180))):
            Circle(SKETCH3_R, mode=Mode.SUBTRACT)
    extrude(amount=BOSS_EXTRUDE3_DEPTH)

    # Fillet1
    fillet1_edges = [part_2.edges().sort_by_distance(p)[0] for p in [
        (-0.249999994, 50.99999922, -8.294801925),
        (9.00000016, 60.249999994, -8.294801925),
        (50.99999922, 60.249999994, -8.294801925),
        (60.249999994, 50.99999984, -8.294801925),
        (60.249999994, 9.00000078, -8.294801925),
        (50.99999984, -0.249999994, -8.294801925),
        (9.00000078, -0.249999994, -8.294801925),
        (-0.249999994, 9.00000016, -8.294801925),
        (21.000000015, 60.249999994, -12.4702005),
        (39.000000015, 60.249999994, -12.4702005),
        (60.249999994, 38.999999985, -12.4702005),
        (60.249999994, 20.999999985, -12.4702005),
        (38.999999985, -0.249999994, -12.4702005),
        (20.999999985, -0.249999994, -12.4702005),
        (-0.249999994, 21.000000015, -12.4702005),
        (-0.249999994, 39.000000015, -12.4702005),
    ]]
    fillet(fillet1_edges, radius=FILLET1_R)


solid = part_2.part
